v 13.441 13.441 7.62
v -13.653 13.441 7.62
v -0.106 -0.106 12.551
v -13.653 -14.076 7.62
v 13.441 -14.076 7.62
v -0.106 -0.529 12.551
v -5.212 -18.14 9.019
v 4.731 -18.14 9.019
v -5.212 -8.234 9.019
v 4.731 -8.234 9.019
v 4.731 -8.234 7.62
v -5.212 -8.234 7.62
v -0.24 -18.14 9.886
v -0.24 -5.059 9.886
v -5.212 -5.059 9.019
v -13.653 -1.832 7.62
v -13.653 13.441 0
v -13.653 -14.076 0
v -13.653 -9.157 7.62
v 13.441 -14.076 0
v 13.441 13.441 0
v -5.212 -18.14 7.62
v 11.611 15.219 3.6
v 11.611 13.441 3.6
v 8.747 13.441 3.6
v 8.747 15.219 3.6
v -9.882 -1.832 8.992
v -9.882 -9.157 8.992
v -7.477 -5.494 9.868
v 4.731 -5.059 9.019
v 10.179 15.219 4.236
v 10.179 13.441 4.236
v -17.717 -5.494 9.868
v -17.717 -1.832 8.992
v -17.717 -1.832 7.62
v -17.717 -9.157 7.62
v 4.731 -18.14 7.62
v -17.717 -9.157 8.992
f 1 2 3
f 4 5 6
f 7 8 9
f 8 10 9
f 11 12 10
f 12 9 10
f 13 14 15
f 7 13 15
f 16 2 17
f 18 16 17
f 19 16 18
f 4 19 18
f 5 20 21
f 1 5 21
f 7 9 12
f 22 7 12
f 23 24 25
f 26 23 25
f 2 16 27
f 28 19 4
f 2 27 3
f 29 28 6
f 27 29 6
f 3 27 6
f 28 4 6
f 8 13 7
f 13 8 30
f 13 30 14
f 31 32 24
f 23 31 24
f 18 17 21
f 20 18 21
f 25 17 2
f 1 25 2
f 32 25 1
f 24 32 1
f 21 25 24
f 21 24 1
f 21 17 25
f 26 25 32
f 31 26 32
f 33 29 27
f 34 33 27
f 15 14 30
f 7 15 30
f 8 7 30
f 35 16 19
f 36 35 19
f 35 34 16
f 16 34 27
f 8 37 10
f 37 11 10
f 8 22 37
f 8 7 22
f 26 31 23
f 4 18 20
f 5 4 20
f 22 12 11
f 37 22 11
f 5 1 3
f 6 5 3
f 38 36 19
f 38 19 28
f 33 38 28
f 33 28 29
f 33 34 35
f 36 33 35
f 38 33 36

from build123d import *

# Parameters (mm, degrees)
F0_W      = 27.0933350548
F0_H      = 27.5166667998
F1_DEPTH  = 7.62
F3_DEPTH  = 6.35
F3_TAPER  = 70
F5_DEPTH  = 5.842
F6_DEPTH  = 4.064
F8_DEPTH  = 13.081
F10_DEPTH = 7.874
F12_DEPTH = 4.064
F14_DEPTH = 1.778


with BuildPart() as f1:
    # F0 (on Top) → F1 (new body)
    with BuildSketch(Plane.XY):
        with Locations((-0.1058331691, -0.3174999729)):
            Rectangle(F0_W, F0_H)
    extrude(amount=F1_DEPTH)

    # F2 (on face) → F3 (join)
    with BuildSketch(Plane.XY.offset(7.62)):
        Polygon((13.4408343583, -14.0758333728), (13.4408343583, 13.440833427), (0, 0), align=None)
        Polygon((13.4408343583, 13.440833427), (-13.6525006965, 13.440833427), (0, 0), align=None)
        Polygon((0, 0), (-13.6525006965, 13.440833427), (-13.6525006965, -14.0758333728), align=None)
        Polygon((0, 0), (-13.6525006965, -14.0758333728), (13.4408343583, -14.0758333728), align=None)
    extrude(amount=F3_DEPTH, taper=F3_TAPER)

    # F9 (on face) → F10 (join)
    with BuildSketch(Plane(origin=(-13.6525006965, 0, 0), x_dir=(0, -1, 0), z_dir=(-1, 0, 0))):
        Polygon((1.8315333873, 8.9923394844), (9.157451801, 8.9923394844), (5.4944925942, 9.8676439375), align=None)
        Polygon((1.8315333873, 7.62), (1.9266750896, 7.62), (9.157451801, 7.62), (9.157451801, 8.9923394844), (1.8315333873, 8.9923394844), align=None)
    extrude(amount=-F10_DEPTH)

    # F11 (on face) → F12 (join)
    with BuildSketch(Plane(origin=(-13.6525006965, 0, 0), x_dir=(0, -1, 0), z_dir=(-1, 0, 0))):
        Polygon((1.8315333873, 8.9923394844), (1.8315333873, 7.62), (9.157451801, 7.62), (9.157451801, 8.9923394844), (5.4944925942, 9.8676439375), align=None)
    extrude(amount=F12_DEPTH)

    # F13 (on face) → F14 (join)
    with BuildSketch(Plane(origin=(0, 13.440833427, 0), x_dir=(-1, 0, 0), z_dir=(0, 1, 0))):
        Polygon((-10.1791918278, 4.2360839434), (-11.6112688556, 3.599605523), (-8.7471147999, 3.599605523), align=None)
    extrude(amount=F14_DEPTH)


with BuildPart() as f5:
    # F4 (on face) → F5 (new body)
    with BuildSketch(Plane.XZ.offset(14.0758333728)):
        Polygon((-5.2116154693, 7.62), (4.0088039823, 7.62), (4.730687011, 7.62), (4.730687011, 9.0190730989), (4.0088039823, 9.0190730989), (3.6806750577, 9.0190730989), (-5.2116154693, 9.0190730989), align=None)
    extrude(amount=-F5_DEPTH)

    # F6 (add): a face of the model
    f6_faces = [f5.faces().sort_by_distance(p)[0] for p in [
        (-0.2404642291, -14.0758333728, 8.3195365494),
    ]]
    extrude(f6_faces, amount=F6_DEPTH)


with BuildPart() as f8:
    # F7 (on face) → F8 (new body)
    with BuildSketch(Plane.XZ.offset(18.1398333728)):
        Polygon((-0.2404642291, 9.8863374442), (-5.2116154693, 9.0190730989), (4.730687011, 9.0190730989), align=None)
    extrude(amount=-F8_DEPTH)


solid = Compound([f1.part, f5.part, f8.part])
